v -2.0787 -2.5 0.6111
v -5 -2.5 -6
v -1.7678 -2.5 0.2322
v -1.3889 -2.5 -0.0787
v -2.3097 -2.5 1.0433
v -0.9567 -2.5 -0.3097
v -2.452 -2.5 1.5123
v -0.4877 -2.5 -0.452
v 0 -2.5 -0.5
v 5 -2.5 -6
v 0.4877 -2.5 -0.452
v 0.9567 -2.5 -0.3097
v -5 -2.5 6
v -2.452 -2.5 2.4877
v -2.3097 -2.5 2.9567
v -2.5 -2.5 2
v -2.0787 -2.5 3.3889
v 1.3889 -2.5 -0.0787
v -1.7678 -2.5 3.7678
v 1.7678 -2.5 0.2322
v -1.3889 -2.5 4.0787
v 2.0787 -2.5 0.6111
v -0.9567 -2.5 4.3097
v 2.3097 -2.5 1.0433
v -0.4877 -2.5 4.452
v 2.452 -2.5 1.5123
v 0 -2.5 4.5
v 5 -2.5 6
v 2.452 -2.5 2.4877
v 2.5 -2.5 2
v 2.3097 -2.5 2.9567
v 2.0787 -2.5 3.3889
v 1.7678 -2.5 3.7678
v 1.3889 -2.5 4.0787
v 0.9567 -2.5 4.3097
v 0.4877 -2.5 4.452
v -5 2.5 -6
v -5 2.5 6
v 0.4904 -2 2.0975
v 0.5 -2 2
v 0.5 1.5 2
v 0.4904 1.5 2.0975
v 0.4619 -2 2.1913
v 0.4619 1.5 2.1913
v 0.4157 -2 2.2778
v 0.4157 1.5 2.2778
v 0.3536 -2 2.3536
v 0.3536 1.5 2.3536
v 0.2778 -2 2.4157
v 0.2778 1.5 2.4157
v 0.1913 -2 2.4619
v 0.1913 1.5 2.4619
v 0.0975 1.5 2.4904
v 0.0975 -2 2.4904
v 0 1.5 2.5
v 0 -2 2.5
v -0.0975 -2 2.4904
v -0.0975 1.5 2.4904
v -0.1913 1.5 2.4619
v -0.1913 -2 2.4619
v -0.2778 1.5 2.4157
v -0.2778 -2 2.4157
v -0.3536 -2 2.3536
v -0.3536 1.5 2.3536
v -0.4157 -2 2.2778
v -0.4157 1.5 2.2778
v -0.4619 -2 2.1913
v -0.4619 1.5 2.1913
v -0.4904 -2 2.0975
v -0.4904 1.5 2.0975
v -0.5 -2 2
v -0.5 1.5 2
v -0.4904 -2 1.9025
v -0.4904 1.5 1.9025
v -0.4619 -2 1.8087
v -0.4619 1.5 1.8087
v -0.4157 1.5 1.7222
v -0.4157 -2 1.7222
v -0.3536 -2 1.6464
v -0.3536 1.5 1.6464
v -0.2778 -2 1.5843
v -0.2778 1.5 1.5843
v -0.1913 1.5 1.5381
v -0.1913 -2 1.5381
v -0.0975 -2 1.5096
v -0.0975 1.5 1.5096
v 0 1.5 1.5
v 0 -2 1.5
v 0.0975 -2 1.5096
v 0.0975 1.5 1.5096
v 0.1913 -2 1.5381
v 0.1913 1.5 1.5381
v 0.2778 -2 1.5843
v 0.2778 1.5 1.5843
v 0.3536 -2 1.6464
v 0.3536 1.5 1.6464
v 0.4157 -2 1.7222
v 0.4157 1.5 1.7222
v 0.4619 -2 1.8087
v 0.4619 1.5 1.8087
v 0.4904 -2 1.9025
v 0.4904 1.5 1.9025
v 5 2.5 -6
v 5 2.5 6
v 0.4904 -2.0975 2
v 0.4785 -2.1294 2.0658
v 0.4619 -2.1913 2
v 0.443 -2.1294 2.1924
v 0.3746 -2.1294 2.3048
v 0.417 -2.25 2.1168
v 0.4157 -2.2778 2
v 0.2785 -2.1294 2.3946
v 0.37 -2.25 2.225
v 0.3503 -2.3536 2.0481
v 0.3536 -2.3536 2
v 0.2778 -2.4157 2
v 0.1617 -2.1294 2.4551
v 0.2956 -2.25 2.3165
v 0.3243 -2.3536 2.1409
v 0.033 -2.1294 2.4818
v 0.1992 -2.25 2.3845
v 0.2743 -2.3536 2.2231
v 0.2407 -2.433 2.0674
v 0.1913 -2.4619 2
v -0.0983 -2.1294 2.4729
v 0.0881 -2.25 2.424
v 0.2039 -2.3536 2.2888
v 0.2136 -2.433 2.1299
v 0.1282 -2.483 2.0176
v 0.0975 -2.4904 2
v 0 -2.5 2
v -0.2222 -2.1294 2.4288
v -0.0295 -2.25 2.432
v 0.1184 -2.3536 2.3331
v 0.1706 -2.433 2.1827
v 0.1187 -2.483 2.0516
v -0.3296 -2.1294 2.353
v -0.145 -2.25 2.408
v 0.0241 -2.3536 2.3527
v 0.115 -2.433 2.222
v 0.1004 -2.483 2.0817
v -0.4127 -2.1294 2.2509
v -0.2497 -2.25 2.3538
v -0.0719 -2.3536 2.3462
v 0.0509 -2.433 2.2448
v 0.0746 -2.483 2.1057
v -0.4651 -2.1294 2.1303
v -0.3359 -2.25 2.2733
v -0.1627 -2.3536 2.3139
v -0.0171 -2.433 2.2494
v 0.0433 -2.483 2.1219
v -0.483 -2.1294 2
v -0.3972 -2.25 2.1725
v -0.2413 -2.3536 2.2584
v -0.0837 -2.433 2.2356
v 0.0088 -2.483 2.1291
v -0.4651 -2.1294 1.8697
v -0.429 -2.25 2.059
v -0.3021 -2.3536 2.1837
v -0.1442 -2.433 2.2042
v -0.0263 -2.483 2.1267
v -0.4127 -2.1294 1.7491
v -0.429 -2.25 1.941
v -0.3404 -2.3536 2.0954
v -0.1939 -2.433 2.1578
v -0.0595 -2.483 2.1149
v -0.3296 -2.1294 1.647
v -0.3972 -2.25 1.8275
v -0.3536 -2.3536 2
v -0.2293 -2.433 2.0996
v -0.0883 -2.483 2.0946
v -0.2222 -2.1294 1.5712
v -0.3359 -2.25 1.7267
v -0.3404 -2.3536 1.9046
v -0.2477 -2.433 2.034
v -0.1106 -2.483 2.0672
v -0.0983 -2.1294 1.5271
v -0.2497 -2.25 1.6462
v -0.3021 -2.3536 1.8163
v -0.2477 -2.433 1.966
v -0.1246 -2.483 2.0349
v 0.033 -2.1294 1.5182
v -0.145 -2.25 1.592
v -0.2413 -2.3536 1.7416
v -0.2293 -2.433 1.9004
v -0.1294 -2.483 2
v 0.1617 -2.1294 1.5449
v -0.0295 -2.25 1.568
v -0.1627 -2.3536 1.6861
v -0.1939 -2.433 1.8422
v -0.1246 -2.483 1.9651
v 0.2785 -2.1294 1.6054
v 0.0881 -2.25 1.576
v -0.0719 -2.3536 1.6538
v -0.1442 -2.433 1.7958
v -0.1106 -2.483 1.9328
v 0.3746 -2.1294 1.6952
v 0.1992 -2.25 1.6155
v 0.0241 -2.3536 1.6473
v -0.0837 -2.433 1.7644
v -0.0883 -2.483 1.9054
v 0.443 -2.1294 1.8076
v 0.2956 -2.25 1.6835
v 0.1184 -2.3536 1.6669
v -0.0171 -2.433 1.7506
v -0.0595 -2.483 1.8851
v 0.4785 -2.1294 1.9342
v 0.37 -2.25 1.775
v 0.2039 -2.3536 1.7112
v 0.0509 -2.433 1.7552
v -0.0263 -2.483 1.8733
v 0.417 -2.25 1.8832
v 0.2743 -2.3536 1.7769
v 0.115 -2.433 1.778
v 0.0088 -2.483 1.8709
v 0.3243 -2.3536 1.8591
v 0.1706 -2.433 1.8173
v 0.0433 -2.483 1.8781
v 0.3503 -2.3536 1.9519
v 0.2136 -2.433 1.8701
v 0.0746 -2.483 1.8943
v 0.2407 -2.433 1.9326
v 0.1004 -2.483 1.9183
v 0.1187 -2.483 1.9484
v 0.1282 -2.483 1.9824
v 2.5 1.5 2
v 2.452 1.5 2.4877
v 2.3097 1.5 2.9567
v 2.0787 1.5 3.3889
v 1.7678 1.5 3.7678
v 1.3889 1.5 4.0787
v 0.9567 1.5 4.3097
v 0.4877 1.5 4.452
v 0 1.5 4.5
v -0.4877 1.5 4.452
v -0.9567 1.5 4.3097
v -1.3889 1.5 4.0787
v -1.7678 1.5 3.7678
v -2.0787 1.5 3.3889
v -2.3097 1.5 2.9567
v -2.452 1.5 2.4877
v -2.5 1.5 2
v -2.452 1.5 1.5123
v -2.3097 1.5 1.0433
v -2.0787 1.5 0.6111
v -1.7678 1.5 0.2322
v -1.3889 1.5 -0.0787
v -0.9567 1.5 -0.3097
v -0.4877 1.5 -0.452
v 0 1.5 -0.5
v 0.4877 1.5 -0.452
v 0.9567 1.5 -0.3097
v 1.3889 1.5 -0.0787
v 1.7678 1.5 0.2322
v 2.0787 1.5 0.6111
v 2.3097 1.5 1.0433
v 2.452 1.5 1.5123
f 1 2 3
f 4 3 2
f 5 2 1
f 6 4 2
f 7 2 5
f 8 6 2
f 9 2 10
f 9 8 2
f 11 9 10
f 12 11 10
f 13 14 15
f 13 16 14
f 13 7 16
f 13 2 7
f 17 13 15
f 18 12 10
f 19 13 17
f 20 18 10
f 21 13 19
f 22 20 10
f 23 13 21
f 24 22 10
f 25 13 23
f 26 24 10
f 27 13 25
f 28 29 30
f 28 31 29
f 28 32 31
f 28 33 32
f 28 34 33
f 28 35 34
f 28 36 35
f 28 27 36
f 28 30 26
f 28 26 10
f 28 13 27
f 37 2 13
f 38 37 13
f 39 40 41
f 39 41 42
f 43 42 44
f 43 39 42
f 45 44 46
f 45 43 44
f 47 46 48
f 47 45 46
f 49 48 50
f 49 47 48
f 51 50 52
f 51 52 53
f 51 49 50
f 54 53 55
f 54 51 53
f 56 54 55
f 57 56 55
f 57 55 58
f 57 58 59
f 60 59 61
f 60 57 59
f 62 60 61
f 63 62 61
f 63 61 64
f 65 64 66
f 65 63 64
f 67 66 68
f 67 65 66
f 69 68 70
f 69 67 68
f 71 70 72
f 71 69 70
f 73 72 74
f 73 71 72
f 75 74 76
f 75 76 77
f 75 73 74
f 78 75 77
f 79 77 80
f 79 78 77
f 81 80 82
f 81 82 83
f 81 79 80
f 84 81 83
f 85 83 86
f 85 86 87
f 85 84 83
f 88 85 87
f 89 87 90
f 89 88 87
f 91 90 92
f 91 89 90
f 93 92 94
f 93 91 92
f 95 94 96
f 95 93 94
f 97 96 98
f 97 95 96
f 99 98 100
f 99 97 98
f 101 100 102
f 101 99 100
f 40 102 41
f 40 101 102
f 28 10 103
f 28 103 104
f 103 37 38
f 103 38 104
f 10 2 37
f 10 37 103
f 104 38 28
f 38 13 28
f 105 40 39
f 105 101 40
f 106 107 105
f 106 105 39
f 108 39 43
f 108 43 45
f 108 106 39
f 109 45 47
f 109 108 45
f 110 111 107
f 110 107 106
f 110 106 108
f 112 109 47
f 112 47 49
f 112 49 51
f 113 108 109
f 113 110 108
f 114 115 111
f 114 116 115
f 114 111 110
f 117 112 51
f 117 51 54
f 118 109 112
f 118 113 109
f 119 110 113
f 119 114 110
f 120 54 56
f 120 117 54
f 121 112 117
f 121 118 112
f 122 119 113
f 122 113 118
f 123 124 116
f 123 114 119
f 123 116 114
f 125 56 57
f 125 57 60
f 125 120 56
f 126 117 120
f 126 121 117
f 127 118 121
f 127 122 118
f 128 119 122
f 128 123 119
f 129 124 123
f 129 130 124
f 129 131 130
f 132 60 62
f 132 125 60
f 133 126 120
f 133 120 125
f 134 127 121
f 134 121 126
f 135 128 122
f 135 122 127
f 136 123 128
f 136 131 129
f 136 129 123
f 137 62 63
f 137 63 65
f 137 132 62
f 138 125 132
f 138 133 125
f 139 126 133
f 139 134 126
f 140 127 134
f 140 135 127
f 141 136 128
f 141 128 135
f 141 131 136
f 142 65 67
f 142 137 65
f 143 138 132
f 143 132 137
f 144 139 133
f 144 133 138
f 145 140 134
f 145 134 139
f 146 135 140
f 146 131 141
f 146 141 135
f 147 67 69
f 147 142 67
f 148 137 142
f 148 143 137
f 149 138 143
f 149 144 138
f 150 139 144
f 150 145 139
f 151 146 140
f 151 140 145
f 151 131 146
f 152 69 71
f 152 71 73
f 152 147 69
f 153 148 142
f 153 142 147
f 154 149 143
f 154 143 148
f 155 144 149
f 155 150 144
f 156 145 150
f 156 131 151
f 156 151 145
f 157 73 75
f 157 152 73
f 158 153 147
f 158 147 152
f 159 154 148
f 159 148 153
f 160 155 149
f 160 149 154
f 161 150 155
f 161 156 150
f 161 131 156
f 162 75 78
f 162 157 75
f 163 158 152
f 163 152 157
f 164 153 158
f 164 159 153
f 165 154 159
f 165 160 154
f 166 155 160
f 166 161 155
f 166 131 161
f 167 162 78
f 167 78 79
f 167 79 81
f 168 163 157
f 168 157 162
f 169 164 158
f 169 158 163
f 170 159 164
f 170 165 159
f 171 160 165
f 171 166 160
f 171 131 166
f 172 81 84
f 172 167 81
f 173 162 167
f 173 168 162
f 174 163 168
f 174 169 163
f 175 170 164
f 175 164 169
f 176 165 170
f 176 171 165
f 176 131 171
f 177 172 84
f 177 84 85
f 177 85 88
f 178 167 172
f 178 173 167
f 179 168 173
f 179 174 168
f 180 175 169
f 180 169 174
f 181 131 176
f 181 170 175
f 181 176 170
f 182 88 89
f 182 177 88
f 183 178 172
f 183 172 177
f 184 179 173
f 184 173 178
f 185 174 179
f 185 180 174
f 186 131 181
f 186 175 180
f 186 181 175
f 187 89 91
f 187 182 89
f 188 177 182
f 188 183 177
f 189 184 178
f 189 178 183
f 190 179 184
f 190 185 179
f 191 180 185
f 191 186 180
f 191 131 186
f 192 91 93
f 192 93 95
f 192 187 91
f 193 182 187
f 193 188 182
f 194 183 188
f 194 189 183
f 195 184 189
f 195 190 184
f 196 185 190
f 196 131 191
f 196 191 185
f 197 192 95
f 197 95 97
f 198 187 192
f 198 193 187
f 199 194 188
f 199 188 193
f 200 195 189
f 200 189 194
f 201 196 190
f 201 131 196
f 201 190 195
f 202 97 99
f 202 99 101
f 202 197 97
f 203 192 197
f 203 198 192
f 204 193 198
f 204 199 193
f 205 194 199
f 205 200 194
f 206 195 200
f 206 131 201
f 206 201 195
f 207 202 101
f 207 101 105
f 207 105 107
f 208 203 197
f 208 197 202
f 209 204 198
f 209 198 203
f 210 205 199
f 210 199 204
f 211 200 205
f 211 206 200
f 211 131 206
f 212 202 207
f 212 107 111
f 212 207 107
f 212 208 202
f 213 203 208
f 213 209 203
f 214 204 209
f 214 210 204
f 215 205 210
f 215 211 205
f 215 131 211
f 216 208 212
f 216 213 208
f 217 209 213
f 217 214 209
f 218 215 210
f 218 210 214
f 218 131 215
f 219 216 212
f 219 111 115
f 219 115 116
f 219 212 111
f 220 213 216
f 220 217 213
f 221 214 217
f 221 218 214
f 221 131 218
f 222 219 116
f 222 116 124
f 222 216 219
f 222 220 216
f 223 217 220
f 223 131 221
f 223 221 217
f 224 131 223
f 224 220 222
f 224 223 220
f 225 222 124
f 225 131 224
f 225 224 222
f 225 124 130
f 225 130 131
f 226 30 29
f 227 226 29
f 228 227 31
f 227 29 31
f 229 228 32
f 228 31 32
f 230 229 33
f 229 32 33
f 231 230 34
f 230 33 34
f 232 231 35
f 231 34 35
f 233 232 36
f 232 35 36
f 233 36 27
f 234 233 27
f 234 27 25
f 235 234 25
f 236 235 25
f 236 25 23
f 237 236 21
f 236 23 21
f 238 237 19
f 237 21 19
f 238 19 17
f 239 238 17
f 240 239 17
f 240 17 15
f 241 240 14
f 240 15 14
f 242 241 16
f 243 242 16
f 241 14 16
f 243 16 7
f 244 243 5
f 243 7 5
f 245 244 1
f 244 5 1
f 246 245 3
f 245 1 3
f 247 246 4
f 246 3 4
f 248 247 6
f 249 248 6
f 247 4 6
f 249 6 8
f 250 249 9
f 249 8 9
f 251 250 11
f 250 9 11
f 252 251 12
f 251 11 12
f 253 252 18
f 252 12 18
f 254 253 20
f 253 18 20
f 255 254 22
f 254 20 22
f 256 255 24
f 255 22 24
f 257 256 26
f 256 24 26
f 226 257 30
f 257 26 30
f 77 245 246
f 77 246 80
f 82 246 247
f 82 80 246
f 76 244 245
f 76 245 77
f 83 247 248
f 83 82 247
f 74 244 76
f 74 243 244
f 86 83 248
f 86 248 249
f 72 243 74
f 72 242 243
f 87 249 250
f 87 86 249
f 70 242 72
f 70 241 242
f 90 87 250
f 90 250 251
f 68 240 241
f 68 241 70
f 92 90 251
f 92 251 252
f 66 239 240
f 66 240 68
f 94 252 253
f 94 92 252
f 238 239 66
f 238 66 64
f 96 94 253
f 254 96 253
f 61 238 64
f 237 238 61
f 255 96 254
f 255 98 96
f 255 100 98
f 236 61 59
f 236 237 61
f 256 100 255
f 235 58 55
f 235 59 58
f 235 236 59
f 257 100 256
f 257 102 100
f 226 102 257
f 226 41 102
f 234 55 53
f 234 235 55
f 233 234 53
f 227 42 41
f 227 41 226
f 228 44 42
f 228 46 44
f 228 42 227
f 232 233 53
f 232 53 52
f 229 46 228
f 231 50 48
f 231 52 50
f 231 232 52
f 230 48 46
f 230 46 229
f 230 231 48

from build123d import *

# Parameters (mm, degrees)
F0_W     = 10
F0_H     = 12
F1_DEPTH = 2.5
F2_R     = 2.5
F2_R_2   = 0.5
F3_DEPTH = 4
F4_R     = 0.5


with BuildPart() as f1:
    # F0 (on Front) → F1 (new body, symmetric)
    with BuildSketch(Plane.XZ):
        Rectangle(F0_W, F0_H)
    extrude(amount=F1_DEPTH, both=True)

    # F2 (on face) → F3 (cut)
    with BuildSketch(Plane.XZ.offset(2.5)):
        with Locations((0, 2)):
            Circle(F2_R)
        with Locations((0, 2)):
            Circle(F2_R_2, mode=Mode.SUBTRACT)
    extrude(amount=-F3_DEPTH, mode=Mode.SUBTRACT)

    # F4
    f4_edges = [f1.edges().sort_by_distance(p)[0] for p in [
        (-0.5, -2.5, 2),
    ]]
    fillet(f4_edges, radius=F4_R)


solid = f1.part
